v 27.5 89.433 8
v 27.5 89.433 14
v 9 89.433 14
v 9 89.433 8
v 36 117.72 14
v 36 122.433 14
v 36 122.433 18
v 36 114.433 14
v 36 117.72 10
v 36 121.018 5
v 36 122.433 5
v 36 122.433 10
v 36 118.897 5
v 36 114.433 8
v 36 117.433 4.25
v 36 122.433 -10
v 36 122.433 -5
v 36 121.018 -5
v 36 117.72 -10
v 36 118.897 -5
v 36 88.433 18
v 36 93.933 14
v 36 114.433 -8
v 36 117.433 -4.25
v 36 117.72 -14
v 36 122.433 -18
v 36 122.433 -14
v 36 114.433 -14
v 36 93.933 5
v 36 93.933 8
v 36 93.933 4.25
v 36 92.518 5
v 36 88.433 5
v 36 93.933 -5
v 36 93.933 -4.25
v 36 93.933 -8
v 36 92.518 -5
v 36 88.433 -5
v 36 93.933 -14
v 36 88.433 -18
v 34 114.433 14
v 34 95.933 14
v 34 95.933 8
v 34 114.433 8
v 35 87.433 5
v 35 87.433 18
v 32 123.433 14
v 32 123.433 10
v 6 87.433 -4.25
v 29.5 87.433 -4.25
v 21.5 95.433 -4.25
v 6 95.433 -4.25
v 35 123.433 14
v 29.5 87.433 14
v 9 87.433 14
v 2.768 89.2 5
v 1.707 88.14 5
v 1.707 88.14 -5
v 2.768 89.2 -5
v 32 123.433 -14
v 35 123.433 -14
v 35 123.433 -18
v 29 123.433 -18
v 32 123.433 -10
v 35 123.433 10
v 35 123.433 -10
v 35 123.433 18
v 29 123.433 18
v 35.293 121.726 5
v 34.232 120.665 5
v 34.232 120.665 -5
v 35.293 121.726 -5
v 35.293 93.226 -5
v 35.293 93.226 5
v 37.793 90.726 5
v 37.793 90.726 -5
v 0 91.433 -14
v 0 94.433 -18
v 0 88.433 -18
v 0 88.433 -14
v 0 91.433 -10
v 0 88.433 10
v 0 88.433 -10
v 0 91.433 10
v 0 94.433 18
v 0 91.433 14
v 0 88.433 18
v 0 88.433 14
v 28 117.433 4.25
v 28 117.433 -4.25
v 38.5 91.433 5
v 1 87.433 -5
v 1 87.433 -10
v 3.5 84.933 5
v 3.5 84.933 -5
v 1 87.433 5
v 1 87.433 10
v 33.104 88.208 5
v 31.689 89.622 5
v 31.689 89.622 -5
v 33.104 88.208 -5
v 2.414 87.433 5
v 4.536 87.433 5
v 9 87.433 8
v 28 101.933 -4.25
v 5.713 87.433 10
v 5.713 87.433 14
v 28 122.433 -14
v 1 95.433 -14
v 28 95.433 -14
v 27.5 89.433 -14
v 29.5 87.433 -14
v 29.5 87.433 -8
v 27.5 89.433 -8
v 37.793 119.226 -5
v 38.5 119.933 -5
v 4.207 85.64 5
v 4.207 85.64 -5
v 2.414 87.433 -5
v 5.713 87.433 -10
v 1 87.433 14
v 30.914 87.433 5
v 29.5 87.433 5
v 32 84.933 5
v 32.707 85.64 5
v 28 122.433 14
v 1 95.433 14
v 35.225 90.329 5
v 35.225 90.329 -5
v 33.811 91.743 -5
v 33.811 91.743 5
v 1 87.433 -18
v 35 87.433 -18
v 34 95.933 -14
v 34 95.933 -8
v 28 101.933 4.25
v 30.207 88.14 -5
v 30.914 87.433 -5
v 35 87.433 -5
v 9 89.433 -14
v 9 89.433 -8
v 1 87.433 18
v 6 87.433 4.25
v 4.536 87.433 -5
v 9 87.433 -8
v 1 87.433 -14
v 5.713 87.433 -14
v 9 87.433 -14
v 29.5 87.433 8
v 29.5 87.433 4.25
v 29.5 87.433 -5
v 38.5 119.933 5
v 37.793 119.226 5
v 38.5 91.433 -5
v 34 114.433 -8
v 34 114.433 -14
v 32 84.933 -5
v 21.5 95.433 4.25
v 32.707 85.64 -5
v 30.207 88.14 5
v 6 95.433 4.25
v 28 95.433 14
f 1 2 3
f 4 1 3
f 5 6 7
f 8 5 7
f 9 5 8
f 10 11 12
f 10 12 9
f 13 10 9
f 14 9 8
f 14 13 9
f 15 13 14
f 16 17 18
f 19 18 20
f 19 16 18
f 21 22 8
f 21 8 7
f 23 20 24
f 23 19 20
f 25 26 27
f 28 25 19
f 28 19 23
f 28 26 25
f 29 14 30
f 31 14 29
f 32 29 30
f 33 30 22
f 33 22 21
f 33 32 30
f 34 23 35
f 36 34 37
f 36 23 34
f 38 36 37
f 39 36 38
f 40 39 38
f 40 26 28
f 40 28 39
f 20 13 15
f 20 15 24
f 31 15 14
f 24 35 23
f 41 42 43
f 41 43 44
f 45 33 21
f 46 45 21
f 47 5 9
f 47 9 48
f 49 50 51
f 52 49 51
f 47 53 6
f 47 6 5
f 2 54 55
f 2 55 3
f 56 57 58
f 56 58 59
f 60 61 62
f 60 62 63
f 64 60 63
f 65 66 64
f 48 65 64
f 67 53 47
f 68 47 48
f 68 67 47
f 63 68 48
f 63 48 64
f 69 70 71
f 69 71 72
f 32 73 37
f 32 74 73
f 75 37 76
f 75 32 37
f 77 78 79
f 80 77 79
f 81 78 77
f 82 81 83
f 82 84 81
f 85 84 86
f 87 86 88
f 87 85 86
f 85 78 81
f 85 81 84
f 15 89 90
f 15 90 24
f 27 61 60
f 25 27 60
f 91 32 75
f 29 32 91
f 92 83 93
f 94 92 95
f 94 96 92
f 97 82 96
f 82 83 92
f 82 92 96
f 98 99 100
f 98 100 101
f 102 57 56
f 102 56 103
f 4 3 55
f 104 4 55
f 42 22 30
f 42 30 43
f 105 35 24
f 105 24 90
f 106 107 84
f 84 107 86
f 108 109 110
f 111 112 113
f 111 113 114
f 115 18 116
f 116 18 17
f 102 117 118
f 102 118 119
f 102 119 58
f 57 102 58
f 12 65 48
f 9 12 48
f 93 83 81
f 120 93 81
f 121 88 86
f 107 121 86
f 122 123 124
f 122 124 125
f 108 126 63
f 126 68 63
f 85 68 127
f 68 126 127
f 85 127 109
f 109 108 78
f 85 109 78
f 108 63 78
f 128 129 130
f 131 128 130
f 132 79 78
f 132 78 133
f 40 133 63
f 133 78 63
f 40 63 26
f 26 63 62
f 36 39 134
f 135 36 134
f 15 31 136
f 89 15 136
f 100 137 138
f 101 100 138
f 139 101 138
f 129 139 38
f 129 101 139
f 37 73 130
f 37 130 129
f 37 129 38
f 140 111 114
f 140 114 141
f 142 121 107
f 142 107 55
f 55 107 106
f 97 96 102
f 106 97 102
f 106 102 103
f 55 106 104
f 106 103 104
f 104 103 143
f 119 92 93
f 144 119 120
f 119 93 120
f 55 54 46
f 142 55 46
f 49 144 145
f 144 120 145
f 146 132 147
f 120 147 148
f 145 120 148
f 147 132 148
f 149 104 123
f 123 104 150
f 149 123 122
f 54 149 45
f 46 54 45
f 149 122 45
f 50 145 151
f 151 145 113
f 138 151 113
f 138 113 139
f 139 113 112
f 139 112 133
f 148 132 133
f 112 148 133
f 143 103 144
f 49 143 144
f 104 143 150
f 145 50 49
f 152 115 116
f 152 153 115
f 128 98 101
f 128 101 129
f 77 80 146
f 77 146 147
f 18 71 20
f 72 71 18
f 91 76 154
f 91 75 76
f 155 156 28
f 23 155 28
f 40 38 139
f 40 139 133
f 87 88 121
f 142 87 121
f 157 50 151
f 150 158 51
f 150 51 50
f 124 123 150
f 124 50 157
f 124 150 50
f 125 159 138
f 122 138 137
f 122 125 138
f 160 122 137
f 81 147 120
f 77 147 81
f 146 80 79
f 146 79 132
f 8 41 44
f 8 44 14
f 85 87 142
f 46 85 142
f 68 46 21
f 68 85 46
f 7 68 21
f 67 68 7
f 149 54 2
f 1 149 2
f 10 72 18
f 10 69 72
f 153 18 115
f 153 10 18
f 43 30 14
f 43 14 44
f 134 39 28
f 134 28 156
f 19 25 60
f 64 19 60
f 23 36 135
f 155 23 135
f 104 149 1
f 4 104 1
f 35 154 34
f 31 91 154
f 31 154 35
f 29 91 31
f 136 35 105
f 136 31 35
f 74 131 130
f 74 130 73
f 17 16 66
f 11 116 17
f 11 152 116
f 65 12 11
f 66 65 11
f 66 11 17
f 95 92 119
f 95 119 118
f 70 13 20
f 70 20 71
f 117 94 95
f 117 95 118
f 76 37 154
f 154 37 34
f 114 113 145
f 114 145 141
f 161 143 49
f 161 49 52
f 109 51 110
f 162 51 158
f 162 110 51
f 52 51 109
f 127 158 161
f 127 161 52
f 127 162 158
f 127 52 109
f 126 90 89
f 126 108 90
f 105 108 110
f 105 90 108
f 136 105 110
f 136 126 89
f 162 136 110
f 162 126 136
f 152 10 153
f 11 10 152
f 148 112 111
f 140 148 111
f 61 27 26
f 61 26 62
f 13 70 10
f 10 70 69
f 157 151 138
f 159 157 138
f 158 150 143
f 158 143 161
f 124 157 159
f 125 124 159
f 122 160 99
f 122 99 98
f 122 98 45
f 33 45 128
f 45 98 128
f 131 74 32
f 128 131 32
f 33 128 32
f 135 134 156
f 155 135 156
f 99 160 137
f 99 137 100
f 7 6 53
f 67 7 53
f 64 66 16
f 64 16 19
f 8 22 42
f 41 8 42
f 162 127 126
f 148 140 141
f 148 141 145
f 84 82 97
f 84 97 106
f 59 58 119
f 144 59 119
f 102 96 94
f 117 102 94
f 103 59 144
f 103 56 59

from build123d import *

# Parameters (mm, degrees)
EXTRUDE_1_DEPTH     = 5
EXTRUDE_1_2_DEPTH   = 5
EXTRUDE_1_3_DEPTH   = 5
EXTRUDE_2_DEPTH     = 13
EXTRUDE_3_DEPTH     = 0.75
CUT_EXTRUDE_1_DEPTH = 6
CUT_EXTRUDE_2_DEPTH = 4
EXTRUDE_5_DEPTH     = 4
CHAMFER_1_SIZE      = 1


with BuildPart() as part:
    # 草图1 → 拉伸1 (new body)
    with BuildSketch(Plane.XY):
        Polygon((21.49998914, 95.432607267), (27.49998914, 89.432607267), (29.49998914, 87.432607267), (31.99998914, 84.932607267), (32.707095921, 85.639714048), (30.914202702, 87.432607267), (30.207095921, 88.139714048), (31.689328968, 89.621947095), (33.103542531, 88.207733533), (35.224862874, 90.329053877), (33.810649312, 91.743267439), (35.292882359, 93.225500486), (35.99998914, 92.518393705), (37.792882359, 90.725500486), (38.49998914, 91.432607267), (35.99998914, 93.932607267), (33.99998914, 95.932607267), (27.99998914, 101.932607267), (27.99998914, 95.432607267), align=None)
    extrude(amount=EXTRUDE_1_DEPTH)



with BuildPart() as body_2:
    # 草图1 → Extrude 1 2 (new body)
    with BuildSketch(Plane.XY):
        Polygon((5.99998914, 87.432607267), (5.99998914, 95.432607267), (0.99998914, 95.432607267), (-1.086e-05, 94.432607267), (-1.086e-05, 88.432607267), (0.99998914, 87.432607267), (3.49998914, 84.932607267), (4.207095921, 85.639714048), (2.414202702, 87.432607267), (1.707095921, 88.139714048), (2.767756093, 89.20037422), (4.535523046, 87.432607267), align=None)
    extrude(amount=EXTRUDE_1_2_DEPTH)


with BuildPart() as body_3:
    # 草图1 → Extrude 1 3 (new body)
    with BuildSketch(Plane.XY):
        Polygon((27.99998914, 117.432607267), (35.99998914, 117.432607267), (35.99998914, 118.897073361), (34.232222187, 120.664840314), (35.292882359, 121.725500486), (35.99998914, 121.018393705), (37.792882359, 119.225500486), (38.49998914, 119.932607267), (35.99998914, 122.432607267), (34.99998914, 123.432607267), (28.99998914, 123.432607267), (27.99998914, 122.432607267), align=None)
    extrude(amount=EXTRUDE_1_3_DEPTH)


with BuildPart() as part_1:
    add(part.part)

    add(body_2.part)  # 拉伸2 merges body 2

    add(body_3.part)  # 拉伸2 merges body 3
    # 草图2 → 拉伸2 (add)
    with BuildSketch(Plane.XY.offset(5)):
        Polygon((34.99998914, 123.432607267), (28.99998914, 123.432607267), (27.99998914, 122.432607267), (27.99998914, 95.432607267), (0.99998914, 95.432607267), (-1.086e-05, 94.432607267), (-1.086e-05, 88.432607267), (0.99998914, 87.432607267), (35.99998914, 87.432607267), (35.99998914, 122.432607267), align=None)
    extrude(amount=EXTRUDE_2_DEPTH)

    # 草图3 → 拉伸3 (add)
    with BuildSketch(Plane(origin=(0, 0, 5), x_dir=(-1, 0, 0), z_dir=(0, 0, -1))):
        Polygon((-27.99998914, 117.432607267), (-35.99998914, 117.432607267), (-35.99998914, 93.932607267), (-27.99998914, 101.932607267), align=None)
    extrude_3 = extrude(amount=EXTRUDE_3_DEPTH)

    # 镜向1: 拉伸3 across plane
    add(extrude_3.mirror(Plane(origin=(61.716298204, 61.716298204, 0), x_dir=(0, 0, 1), z_dir=(-0.707106781, -0.707106781, 0))))

    # 草图4 → 切除-拉伸1 (cut)
    with BuildSketch(Plane.XY.offset(14)):
        Polygon((33.99998914, 114.432607267), (35.99998914, 114.432607267), (35.99998914, 93.932607267), (33.99998914, 95.932607267), align=None)
    cut_extrude_1 = extrude(amount=-CUT_EXTRUDE_1_DEPTH, mode=Mode.SUBTRACT)

    # 草图6 → 切除-拉伸2 (cut)
    with BuildSketch(Plane.XY.offset(14)):
        Polygon((31.99998914, 123.432607267), (34.99998914, 123.432607267), (35.99998914, 122.432607267), (35.99998914, 117.72001524), align=None)
    cut_extrude_2 = extrude(amount=-CUT_EXTRUDE_2_DEPTH, mode=Mode.SUBTRACT)

    # 镜向2: 切除-拉伸1, 切除-拉伸2 across plane
    add(cut_extrude_1.mirror(Plane(origin=(61.716298204, 61.716298204, 0), x_dir=(0, 0, 1), z_dir=(-0.707106781, -0.707106781, 0))), mode=Mode.SUBTRACT)
    add(cut_extrude_2.mirror(Plane(origin=(61.716298204, 61.716298204, 0), x_dir=(0, 0, 1), z_dir=(-0.707106781, -0.707106781, 0))), mode=Mode.SUBTRACT)

    # 草图7 → 拉伸5 (add)
    with BuildSketch(Plane.XY.offset(18)):
        Polygon((0.99998914, 95.432607267), (27.99998914, 95.432607267), (27.99998914, 122.432607267), align=None)
    extrude(amount=-EXTRUDE_5_DEPTH)

    # 镜向4: part across plane


with BuildPart() as part_2:
    add(part_1.part)
    add(part_1.part.mirror(Plane(origin=(0, 0, 0), x_dir=(1, 0, 0), z_dir=(0, 0, -1))))

    # 倒角1
    chamfer_1_edges = [part_2.edges().sort_by_distance(p)[0] for p in [
        (35.99998914, 87.432607267, -11.5),
        (35.99998914, 87.432607267, 11.5),
    ]]
    chamfer(chamfer_1_edges, length=CHAMFER_1_SIZE)


solid = part_2.part
